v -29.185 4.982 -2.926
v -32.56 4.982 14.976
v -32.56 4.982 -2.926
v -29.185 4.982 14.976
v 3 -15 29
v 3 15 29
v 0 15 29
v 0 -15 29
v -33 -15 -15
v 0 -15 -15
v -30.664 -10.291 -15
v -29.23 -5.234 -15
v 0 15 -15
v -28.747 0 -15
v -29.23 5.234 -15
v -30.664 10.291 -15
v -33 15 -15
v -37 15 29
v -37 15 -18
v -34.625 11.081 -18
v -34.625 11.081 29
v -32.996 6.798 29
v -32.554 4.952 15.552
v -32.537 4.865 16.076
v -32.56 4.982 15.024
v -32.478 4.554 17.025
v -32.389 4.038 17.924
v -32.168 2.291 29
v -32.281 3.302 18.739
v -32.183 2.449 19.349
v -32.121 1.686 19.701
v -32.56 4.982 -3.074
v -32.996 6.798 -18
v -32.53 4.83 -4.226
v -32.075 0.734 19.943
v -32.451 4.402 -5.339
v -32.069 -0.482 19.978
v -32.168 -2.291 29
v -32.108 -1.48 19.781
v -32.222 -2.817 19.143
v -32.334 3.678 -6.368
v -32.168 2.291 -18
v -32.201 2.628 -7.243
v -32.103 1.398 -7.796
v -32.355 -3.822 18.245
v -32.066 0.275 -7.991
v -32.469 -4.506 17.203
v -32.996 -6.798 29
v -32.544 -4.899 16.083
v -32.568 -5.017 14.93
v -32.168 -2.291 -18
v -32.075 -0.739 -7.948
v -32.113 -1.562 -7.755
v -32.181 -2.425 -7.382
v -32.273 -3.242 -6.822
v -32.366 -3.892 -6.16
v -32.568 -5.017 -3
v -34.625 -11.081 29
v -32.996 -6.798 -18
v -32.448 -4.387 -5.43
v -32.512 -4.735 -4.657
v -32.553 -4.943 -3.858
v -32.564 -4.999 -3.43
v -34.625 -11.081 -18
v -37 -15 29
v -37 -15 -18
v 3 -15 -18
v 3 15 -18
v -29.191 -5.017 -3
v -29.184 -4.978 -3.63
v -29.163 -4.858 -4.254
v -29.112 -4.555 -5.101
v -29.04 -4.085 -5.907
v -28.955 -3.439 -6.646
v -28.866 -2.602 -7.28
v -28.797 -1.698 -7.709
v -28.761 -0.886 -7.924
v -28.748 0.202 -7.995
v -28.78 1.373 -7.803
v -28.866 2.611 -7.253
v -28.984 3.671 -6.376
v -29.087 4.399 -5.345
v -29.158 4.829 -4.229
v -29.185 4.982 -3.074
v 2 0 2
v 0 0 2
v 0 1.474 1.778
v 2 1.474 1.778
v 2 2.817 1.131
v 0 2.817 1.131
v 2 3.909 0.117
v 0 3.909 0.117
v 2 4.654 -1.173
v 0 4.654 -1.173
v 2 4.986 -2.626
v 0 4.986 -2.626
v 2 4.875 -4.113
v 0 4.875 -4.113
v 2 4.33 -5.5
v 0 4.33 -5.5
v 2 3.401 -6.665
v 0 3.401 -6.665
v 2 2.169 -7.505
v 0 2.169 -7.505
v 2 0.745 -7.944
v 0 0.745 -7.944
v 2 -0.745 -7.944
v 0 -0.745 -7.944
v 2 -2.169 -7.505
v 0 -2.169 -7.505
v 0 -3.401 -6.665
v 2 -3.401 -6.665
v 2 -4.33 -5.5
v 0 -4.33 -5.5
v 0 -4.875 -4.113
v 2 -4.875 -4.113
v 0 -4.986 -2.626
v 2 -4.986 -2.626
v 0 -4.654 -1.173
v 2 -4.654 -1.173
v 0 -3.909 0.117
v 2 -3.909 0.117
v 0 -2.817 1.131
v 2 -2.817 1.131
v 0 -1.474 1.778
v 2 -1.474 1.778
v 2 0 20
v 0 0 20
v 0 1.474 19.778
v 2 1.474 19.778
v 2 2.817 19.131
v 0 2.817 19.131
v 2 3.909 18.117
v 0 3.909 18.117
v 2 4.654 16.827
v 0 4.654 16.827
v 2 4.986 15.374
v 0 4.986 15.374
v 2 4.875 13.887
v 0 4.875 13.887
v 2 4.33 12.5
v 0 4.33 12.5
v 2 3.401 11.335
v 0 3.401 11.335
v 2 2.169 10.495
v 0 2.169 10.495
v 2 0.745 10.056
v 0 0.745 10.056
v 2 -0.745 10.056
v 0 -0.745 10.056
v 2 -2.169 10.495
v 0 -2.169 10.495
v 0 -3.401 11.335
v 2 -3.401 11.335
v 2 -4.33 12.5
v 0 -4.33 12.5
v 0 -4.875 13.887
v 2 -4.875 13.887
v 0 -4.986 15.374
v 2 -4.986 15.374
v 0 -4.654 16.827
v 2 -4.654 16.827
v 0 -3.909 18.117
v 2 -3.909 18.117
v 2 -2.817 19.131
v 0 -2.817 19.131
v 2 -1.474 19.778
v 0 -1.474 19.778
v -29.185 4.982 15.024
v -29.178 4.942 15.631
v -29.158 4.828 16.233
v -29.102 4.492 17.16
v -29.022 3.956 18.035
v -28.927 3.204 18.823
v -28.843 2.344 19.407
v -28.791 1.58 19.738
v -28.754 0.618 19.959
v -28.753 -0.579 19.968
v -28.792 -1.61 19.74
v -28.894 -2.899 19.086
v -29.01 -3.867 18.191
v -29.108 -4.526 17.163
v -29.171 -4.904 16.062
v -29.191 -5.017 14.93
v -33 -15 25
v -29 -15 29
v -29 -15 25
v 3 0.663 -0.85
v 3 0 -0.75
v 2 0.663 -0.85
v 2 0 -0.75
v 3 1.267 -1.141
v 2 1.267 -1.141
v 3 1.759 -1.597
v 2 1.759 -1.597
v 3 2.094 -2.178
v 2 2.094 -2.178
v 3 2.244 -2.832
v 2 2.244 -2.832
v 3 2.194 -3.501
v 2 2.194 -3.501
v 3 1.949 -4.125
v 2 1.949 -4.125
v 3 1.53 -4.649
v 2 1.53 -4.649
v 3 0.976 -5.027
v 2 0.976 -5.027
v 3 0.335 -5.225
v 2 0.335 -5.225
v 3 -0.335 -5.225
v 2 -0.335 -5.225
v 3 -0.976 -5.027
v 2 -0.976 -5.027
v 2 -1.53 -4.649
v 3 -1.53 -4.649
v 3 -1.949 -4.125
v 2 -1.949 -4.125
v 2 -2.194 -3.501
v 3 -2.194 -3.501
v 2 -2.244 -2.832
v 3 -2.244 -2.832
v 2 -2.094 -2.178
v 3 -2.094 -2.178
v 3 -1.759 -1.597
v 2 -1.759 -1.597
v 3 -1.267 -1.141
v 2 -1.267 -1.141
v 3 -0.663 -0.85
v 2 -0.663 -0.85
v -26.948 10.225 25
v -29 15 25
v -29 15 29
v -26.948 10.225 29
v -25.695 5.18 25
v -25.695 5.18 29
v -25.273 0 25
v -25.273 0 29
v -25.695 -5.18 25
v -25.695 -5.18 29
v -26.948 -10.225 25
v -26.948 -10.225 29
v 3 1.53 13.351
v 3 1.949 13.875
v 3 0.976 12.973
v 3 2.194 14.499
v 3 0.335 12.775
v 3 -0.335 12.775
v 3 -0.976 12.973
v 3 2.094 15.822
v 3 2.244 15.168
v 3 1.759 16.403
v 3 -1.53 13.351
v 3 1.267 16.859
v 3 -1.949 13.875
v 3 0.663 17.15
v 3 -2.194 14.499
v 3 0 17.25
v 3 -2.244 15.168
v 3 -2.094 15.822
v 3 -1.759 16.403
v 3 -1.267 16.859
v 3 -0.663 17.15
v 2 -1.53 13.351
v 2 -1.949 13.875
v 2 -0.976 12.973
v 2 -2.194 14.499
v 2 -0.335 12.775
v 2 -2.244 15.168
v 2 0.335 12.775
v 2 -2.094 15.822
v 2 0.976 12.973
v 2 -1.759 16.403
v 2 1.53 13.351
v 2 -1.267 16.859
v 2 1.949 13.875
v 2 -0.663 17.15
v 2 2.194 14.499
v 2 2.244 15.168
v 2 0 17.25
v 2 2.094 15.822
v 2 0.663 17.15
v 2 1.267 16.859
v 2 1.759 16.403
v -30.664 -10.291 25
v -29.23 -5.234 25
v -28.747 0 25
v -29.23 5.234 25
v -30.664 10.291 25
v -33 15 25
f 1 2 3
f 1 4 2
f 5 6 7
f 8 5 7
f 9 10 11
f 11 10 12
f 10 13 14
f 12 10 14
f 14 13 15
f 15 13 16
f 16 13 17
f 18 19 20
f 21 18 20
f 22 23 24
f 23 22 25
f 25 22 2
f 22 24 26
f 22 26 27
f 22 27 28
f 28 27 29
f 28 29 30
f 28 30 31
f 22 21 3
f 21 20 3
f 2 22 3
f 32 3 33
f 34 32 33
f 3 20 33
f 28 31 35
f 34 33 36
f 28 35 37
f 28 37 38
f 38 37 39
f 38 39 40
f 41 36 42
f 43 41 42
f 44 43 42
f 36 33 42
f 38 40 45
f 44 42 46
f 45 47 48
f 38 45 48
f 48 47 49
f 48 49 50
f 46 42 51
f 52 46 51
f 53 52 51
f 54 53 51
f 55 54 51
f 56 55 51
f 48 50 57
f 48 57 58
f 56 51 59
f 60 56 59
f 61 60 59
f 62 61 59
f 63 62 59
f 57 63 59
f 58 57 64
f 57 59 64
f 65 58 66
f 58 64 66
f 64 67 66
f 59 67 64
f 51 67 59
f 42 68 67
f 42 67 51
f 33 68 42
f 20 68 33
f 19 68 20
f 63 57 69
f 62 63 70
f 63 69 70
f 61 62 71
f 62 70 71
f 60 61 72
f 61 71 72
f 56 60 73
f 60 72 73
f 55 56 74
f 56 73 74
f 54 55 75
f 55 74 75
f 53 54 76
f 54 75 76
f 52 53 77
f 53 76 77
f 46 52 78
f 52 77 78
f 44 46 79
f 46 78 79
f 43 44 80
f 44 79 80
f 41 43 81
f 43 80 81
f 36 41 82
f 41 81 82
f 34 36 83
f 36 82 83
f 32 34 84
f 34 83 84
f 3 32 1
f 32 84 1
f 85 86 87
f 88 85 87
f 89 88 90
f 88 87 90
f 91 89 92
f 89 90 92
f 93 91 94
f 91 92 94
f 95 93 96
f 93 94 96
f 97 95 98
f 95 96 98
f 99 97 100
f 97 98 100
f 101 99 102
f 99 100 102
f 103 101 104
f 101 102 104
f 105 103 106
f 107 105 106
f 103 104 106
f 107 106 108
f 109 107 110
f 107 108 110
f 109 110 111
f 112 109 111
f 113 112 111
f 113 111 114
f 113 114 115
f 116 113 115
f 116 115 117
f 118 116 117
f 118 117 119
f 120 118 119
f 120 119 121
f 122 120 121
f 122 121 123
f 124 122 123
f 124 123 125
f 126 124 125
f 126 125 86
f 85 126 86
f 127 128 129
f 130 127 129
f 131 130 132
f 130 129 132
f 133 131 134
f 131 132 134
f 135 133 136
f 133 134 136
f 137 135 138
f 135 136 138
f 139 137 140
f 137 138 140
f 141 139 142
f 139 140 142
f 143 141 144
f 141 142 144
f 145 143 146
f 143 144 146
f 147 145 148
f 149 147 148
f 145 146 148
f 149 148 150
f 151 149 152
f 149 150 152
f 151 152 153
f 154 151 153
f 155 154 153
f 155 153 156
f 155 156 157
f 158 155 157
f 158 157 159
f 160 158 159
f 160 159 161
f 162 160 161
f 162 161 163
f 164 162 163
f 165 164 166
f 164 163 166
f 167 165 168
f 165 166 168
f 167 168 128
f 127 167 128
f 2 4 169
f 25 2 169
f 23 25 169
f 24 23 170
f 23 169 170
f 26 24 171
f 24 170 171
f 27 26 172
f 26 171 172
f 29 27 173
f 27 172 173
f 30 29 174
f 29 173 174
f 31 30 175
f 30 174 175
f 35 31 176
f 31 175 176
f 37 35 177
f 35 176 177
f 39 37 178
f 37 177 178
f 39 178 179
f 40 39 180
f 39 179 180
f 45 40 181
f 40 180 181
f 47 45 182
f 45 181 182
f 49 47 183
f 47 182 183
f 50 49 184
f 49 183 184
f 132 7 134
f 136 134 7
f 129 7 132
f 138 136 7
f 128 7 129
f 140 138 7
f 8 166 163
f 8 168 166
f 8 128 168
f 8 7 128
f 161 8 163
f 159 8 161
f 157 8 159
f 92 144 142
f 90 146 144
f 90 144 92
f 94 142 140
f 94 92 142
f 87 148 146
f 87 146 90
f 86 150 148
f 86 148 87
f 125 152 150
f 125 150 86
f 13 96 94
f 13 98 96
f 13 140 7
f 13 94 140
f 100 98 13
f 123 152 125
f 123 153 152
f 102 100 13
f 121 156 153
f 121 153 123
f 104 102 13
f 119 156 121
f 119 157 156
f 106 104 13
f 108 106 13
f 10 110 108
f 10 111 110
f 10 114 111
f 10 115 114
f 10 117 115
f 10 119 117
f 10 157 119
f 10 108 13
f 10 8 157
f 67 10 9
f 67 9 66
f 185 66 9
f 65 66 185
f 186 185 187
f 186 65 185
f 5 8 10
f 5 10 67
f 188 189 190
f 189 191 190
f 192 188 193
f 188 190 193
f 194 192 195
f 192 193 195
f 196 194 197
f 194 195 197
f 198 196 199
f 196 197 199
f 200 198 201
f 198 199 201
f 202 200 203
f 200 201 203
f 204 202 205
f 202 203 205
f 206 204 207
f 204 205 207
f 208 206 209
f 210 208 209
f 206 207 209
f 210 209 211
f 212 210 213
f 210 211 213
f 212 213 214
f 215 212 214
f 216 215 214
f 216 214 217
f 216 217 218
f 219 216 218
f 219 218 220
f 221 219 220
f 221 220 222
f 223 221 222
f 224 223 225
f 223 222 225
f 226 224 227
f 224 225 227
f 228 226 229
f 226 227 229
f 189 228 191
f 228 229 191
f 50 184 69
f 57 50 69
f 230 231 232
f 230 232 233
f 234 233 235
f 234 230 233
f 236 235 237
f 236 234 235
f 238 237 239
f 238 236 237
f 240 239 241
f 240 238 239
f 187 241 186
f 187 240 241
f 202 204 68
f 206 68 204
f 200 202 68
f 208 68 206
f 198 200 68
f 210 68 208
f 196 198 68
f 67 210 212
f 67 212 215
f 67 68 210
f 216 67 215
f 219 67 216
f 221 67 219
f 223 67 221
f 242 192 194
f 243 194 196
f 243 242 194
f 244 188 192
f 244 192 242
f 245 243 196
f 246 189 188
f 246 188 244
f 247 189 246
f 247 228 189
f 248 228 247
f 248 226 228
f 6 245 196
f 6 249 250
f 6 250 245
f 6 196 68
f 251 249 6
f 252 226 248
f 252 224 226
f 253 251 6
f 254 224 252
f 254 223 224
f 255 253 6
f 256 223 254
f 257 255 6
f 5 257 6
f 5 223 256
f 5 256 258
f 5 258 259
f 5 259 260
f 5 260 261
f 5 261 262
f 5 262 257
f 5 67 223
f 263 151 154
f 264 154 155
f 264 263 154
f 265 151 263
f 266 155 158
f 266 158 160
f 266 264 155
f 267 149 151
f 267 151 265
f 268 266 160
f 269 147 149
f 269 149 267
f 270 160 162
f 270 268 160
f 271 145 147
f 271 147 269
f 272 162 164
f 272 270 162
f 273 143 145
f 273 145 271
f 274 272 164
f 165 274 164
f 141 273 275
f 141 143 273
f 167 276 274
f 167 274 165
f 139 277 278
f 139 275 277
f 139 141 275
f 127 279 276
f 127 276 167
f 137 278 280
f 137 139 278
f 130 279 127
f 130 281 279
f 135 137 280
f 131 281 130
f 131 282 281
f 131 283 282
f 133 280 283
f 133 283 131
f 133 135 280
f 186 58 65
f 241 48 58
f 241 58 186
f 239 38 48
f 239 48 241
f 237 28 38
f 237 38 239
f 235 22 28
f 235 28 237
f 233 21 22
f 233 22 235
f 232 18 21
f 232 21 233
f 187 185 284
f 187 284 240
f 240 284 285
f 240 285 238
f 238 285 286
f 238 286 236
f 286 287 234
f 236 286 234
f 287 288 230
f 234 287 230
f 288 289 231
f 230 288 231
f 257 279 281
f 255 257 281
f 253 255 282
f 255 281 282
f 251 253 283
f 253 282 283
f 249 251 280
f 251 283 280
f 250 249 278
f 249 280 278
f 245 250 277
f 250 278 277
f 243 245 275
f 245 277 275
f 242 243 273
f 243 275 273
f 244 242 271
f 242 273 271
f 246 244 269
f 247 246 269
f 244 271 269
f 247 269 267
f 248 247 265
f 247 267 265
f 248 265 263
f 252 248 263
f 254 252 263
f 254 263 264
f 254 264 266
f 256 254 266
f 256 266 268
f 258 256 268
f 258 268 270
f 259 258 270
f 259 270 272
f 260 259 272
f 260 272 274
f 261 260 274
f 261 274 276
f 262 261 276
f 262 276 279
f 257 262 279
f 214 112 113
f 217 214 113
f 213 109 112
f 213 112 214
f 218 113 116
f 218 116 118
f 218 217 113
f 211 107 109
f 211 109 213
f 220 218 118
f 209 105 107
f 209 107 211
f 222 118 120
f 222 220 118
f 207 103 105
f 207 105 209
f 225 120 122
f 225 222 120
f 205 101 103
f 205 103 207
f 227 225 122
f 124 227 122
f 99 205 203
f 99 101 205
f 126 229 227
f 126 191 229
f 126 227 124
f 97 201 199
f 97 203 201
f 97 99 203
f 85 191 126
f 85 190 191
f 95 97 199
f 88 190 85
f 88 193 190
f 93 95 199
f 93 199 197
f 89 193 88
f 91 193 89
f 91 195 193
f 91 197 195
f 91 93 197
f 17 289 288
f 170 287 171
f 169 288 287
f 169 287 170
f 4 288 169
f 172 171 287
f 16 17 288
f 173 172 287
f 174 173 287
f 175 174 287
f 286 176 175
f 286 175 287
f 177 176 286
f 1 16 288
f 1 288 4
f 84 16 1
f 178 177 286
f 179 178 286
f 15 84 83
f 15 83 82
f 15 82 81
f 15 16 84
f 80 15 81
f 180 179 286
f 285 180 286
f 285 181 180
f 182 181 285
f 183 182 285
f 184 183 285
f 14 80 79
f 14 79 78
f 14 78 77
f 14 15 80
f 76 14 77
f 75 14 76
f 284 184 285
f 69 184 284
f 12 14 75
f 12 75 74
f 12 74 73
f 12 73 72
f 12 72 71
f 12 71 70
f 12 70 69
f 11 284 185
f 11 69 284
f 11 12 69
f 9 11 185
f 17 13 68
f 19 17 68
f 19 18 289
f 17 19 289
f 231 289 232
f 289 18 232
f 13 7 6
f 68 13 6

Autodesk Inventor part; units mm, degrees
ref_plane "YZ Plane" through (0, 0, 0) normal (1, 0, 0) x (0, 1, 0)
ref_plane "XZ Plane" through (0, 0, 0) normal (0, 1, 0) x (-1, 0, 0)
ref_plane "XY Plane" through (0, 0, 0) normal (0, 0, 1) x (1, 0, 0)
sketch "Sketch1" plane through (0, 0, 0) normal (1, 0, 0) x (0, 1, 0)
  line L0 (-15, -15) -> (15, -15)
  line L1 (15, -15) -> (15, 15)
  line L2 (15, 15) -> (-15, 15)
  line L3 (-15, 15) -> (-15, -15)
  line L4 (-15, -15) -> (15, 15) construction
  line L5 (15, -15) -> (-15, 15) construction
  point P0 (0, 0)
  dimension "d0" = 30
  dimension "d1" = 30
extrude "Extrusion1" add sketch "Sketch1" along normal blind 3
sketch "Sketch2" plane through (0, -15, -15) normal (0, 0, -1) x (-1, 0, 0)
  line L0 (0, 30) -> (-3, 30) projected
  line L1 (-3, 30) -> (37, 30)
  line L2 (37, 30) -> (37, 0)
  line L3 (37, 0) -> (-3, 0)
  line L4 (-3, 0) -> (-3, 30)
  point P0 (0, 15)
  dimension "d4" = 40
  dimension "d5" = 30
extrude "Extrusion2" add sketch "Sketch2" along normal blind 3
sketch "Sketch3" plane through (0, -15, -15) normal (0, 0, 1) x (1, 0, 0)
  line L0 (0, 0) -> (-37, 0) projected
  line L1 (-37, 0) -> (-37, 30) projected
  arc A0 (-37, 0) -> (-37, 30) centre (-57.325, 15) ccw
  point P0 (0, 15)
extrude "Extrusion3" cut sketch "Sketch3" against normal blind 3
sketch "Sketch4" plane through (0, -15, -15) normal (0, 0, 1) x (1, 0, 0)
  line L0 (-37, 30) -> (0, 30) projected
  arc A0 (-37, 0) -> (-37, 30) centre (-57.325, 15) ccw projected
  line L1 (-33.6755, 30) -> (-37, 30)
  point P0 (0, 15)
sketch "Sketch5" plane through (0, -15, -15) normal (0, 0, 1) x (1, 0, 0)
  arc A0 (-37, 0) -> (-37, 30) centre (-57.325, 15) ccw projected
  line L0 (-37, 30) -> (-33, 30)
  line L1 (-37, 30) -> (0, 30) projected
  line L2 (0, 0) -> (-37, 0) projected
  arc A1 (-33, 0) -> (-33, 30) centre (-57.325, 15) ccw
  line L3 (-33, 0) -> (-37, 0)
  arc A2 (-37, 0) -> (-37, 30) centre (-57.325, 15) ccw
  point P0 (0, 15)
  dimension "d10" = 4
extrude "Extrusion4" add sketch "Sketch5" along normal blind 40
sketch "Sketch6" plane through (0, -15, 25) normal (0, 0, 1) x (1, 0, 0)
  line L0 (-33, 30) -> (-37, 30) projected
  line L1 (-37, 30) -> (-29, 30)
  arc A0 (-37, 0) -> (-37, 30) centre (-57.325, 15) ccw projected
  line L2 (-37, 0) -> (-29, 0)
  arc A1 (-29, 0) -> (-29, 30) centre (-57.325, 15) ccw
  arc A2 (-37, 0) -> (-37, 30) centre (-57.325, 15) ccw
  point P0 (0, 15)
  dimension "d13" = 8
extrude "Extrusion5" add sketch "Sketch6" along normal blind 4
sketch "Sketch7" plane through (0, -15, 15) normal (0, -1, 0) x (1, 0, 0)
  point P0 (0, -15)
sketch "Sketch8" plane through (0, -15, 15) normal (0, 0, 1) x (1, 0, 0)
  point P0 (0, 15)
sketch "Sketch9" plane through (0, -15, 15) normal (0, -1, 0) x (1, 0, 0)
  line L0 (3, 0) -> (3, -33) projected
  line L1 (3, 0) -> (3, 14)
  line L2 (3, 14) -> (0, 14)
  line L3 (0, 0) -> (3, 0) projected
  line L4 (0, 14) -> (0, 0)
  line L5 (0, 0) -> (3, 0)
  point P0 (0, -15)
  dimension "d16" = 14
extrude "Extrusion6" add sketch "Sketch9" against normal blind 30
sketch "Sketch10" plane through (0, 0, 0) normal (-1, 0, 0) x (0, 0, 1)
  point P0 (0, 0)
sketch "Sketch11" plane through (0, 0, 0) normal (-1, 0, 0) x (0, 0, 1)
  arc A0 (14.9299, -5.0174) -> (14.976, 4.9821) centre (15, -0.0179) ccw
  arc A1 (-2.9259, 4.9821) -> (-3, -5.0174) centre (-3, -0.0174) ccw
  line L0 (-15, -15) -> (-15, 15) projected
  line L1 (29, -15) -> (29, 15) projected
  line L2 (14.9299, -5.0174) -> (-3, -5.0174)
  line L3 (15.024, 4.9821) -> (-3.0741, 4.9821)
  line L4 (29, -15) -> (-15, -15) projected
  line L5 (-15, 15) -> (29, 15) projected
  point P0 (0, 0)
  point P1 (-15, 0)
  point P2 (29, 0)
  dimension "d19" = 10
  dimension "d20" = 10
  dimension "d21" = 12
  dimension "d22" = 14
extrude "Extrusion7" cut sketch "Sketch11" along normal blind 50 contours L2 A1 L3 A0
sketch "Sketch12" plane through (0, 0, 0) normal (-1, 0, 0) x (0, 0, 1)
  circle A0 centre (-3, 0) radius 5
  circle A1 centre (15, 0) radius 5
  line L0 (29, -15) -> (29, 15) projected
  line L1 (-15, -15) -> (-15, 15) projected
  point P0 (0, 0)
  point P1 (29, 0)
  point P2 (-15, 0)
  dimension "d25" = 10
  dimension "d26" = 10
  dimension "d27" = 14
  dimension "d28" = 12
extrude "Extrusion8" cut sketch "Sketch12" against normal blind 2
sketch "Sketch13" plane through (2, 0, 15) normal (-1, 0, 0) x (0, 0, 1)
  circle A0 centre (0, 0) radius 2.25
  circle A1 centre (-18, 0) radius 2.25
  circle A2 centre (-18, 0) radius 5 projected
  point P0 (-15, 0)
  dimension "d31" = 4.5
  dimension "d32" = 4.5
  dimension "d33" = 2.75
extrude "Extrusion9" cut sketch "Sketch13" against normal blind 3 contours A0 | A1
sketch "Sketch14" plane through (3, 0, 0) normal (1, 0, 0) x (0, 0, -1)
  line L0 (-29, 15) -> (18, 15) projected
  line L1 (-29, -15) -> (18, -15) projected
  line L2 (-29, 15) -> (18, 15)
  line L3 (18, 15) -> (18, -15)
  line L4 (18, -15) -> (-29, -15)
  line L5 (-29, -15) -> (-29, 15)
  circle A0 centre (3, 0) radius 2.25 projected
  circle A1 centre (3, 0) radius 5
  circle A2 centre (-15, 0) radius 5 projected
  circle A3 centre (-15, 0) radius 5
  point P0 (0, 0)
properties part number "headphones_hook1.1"
